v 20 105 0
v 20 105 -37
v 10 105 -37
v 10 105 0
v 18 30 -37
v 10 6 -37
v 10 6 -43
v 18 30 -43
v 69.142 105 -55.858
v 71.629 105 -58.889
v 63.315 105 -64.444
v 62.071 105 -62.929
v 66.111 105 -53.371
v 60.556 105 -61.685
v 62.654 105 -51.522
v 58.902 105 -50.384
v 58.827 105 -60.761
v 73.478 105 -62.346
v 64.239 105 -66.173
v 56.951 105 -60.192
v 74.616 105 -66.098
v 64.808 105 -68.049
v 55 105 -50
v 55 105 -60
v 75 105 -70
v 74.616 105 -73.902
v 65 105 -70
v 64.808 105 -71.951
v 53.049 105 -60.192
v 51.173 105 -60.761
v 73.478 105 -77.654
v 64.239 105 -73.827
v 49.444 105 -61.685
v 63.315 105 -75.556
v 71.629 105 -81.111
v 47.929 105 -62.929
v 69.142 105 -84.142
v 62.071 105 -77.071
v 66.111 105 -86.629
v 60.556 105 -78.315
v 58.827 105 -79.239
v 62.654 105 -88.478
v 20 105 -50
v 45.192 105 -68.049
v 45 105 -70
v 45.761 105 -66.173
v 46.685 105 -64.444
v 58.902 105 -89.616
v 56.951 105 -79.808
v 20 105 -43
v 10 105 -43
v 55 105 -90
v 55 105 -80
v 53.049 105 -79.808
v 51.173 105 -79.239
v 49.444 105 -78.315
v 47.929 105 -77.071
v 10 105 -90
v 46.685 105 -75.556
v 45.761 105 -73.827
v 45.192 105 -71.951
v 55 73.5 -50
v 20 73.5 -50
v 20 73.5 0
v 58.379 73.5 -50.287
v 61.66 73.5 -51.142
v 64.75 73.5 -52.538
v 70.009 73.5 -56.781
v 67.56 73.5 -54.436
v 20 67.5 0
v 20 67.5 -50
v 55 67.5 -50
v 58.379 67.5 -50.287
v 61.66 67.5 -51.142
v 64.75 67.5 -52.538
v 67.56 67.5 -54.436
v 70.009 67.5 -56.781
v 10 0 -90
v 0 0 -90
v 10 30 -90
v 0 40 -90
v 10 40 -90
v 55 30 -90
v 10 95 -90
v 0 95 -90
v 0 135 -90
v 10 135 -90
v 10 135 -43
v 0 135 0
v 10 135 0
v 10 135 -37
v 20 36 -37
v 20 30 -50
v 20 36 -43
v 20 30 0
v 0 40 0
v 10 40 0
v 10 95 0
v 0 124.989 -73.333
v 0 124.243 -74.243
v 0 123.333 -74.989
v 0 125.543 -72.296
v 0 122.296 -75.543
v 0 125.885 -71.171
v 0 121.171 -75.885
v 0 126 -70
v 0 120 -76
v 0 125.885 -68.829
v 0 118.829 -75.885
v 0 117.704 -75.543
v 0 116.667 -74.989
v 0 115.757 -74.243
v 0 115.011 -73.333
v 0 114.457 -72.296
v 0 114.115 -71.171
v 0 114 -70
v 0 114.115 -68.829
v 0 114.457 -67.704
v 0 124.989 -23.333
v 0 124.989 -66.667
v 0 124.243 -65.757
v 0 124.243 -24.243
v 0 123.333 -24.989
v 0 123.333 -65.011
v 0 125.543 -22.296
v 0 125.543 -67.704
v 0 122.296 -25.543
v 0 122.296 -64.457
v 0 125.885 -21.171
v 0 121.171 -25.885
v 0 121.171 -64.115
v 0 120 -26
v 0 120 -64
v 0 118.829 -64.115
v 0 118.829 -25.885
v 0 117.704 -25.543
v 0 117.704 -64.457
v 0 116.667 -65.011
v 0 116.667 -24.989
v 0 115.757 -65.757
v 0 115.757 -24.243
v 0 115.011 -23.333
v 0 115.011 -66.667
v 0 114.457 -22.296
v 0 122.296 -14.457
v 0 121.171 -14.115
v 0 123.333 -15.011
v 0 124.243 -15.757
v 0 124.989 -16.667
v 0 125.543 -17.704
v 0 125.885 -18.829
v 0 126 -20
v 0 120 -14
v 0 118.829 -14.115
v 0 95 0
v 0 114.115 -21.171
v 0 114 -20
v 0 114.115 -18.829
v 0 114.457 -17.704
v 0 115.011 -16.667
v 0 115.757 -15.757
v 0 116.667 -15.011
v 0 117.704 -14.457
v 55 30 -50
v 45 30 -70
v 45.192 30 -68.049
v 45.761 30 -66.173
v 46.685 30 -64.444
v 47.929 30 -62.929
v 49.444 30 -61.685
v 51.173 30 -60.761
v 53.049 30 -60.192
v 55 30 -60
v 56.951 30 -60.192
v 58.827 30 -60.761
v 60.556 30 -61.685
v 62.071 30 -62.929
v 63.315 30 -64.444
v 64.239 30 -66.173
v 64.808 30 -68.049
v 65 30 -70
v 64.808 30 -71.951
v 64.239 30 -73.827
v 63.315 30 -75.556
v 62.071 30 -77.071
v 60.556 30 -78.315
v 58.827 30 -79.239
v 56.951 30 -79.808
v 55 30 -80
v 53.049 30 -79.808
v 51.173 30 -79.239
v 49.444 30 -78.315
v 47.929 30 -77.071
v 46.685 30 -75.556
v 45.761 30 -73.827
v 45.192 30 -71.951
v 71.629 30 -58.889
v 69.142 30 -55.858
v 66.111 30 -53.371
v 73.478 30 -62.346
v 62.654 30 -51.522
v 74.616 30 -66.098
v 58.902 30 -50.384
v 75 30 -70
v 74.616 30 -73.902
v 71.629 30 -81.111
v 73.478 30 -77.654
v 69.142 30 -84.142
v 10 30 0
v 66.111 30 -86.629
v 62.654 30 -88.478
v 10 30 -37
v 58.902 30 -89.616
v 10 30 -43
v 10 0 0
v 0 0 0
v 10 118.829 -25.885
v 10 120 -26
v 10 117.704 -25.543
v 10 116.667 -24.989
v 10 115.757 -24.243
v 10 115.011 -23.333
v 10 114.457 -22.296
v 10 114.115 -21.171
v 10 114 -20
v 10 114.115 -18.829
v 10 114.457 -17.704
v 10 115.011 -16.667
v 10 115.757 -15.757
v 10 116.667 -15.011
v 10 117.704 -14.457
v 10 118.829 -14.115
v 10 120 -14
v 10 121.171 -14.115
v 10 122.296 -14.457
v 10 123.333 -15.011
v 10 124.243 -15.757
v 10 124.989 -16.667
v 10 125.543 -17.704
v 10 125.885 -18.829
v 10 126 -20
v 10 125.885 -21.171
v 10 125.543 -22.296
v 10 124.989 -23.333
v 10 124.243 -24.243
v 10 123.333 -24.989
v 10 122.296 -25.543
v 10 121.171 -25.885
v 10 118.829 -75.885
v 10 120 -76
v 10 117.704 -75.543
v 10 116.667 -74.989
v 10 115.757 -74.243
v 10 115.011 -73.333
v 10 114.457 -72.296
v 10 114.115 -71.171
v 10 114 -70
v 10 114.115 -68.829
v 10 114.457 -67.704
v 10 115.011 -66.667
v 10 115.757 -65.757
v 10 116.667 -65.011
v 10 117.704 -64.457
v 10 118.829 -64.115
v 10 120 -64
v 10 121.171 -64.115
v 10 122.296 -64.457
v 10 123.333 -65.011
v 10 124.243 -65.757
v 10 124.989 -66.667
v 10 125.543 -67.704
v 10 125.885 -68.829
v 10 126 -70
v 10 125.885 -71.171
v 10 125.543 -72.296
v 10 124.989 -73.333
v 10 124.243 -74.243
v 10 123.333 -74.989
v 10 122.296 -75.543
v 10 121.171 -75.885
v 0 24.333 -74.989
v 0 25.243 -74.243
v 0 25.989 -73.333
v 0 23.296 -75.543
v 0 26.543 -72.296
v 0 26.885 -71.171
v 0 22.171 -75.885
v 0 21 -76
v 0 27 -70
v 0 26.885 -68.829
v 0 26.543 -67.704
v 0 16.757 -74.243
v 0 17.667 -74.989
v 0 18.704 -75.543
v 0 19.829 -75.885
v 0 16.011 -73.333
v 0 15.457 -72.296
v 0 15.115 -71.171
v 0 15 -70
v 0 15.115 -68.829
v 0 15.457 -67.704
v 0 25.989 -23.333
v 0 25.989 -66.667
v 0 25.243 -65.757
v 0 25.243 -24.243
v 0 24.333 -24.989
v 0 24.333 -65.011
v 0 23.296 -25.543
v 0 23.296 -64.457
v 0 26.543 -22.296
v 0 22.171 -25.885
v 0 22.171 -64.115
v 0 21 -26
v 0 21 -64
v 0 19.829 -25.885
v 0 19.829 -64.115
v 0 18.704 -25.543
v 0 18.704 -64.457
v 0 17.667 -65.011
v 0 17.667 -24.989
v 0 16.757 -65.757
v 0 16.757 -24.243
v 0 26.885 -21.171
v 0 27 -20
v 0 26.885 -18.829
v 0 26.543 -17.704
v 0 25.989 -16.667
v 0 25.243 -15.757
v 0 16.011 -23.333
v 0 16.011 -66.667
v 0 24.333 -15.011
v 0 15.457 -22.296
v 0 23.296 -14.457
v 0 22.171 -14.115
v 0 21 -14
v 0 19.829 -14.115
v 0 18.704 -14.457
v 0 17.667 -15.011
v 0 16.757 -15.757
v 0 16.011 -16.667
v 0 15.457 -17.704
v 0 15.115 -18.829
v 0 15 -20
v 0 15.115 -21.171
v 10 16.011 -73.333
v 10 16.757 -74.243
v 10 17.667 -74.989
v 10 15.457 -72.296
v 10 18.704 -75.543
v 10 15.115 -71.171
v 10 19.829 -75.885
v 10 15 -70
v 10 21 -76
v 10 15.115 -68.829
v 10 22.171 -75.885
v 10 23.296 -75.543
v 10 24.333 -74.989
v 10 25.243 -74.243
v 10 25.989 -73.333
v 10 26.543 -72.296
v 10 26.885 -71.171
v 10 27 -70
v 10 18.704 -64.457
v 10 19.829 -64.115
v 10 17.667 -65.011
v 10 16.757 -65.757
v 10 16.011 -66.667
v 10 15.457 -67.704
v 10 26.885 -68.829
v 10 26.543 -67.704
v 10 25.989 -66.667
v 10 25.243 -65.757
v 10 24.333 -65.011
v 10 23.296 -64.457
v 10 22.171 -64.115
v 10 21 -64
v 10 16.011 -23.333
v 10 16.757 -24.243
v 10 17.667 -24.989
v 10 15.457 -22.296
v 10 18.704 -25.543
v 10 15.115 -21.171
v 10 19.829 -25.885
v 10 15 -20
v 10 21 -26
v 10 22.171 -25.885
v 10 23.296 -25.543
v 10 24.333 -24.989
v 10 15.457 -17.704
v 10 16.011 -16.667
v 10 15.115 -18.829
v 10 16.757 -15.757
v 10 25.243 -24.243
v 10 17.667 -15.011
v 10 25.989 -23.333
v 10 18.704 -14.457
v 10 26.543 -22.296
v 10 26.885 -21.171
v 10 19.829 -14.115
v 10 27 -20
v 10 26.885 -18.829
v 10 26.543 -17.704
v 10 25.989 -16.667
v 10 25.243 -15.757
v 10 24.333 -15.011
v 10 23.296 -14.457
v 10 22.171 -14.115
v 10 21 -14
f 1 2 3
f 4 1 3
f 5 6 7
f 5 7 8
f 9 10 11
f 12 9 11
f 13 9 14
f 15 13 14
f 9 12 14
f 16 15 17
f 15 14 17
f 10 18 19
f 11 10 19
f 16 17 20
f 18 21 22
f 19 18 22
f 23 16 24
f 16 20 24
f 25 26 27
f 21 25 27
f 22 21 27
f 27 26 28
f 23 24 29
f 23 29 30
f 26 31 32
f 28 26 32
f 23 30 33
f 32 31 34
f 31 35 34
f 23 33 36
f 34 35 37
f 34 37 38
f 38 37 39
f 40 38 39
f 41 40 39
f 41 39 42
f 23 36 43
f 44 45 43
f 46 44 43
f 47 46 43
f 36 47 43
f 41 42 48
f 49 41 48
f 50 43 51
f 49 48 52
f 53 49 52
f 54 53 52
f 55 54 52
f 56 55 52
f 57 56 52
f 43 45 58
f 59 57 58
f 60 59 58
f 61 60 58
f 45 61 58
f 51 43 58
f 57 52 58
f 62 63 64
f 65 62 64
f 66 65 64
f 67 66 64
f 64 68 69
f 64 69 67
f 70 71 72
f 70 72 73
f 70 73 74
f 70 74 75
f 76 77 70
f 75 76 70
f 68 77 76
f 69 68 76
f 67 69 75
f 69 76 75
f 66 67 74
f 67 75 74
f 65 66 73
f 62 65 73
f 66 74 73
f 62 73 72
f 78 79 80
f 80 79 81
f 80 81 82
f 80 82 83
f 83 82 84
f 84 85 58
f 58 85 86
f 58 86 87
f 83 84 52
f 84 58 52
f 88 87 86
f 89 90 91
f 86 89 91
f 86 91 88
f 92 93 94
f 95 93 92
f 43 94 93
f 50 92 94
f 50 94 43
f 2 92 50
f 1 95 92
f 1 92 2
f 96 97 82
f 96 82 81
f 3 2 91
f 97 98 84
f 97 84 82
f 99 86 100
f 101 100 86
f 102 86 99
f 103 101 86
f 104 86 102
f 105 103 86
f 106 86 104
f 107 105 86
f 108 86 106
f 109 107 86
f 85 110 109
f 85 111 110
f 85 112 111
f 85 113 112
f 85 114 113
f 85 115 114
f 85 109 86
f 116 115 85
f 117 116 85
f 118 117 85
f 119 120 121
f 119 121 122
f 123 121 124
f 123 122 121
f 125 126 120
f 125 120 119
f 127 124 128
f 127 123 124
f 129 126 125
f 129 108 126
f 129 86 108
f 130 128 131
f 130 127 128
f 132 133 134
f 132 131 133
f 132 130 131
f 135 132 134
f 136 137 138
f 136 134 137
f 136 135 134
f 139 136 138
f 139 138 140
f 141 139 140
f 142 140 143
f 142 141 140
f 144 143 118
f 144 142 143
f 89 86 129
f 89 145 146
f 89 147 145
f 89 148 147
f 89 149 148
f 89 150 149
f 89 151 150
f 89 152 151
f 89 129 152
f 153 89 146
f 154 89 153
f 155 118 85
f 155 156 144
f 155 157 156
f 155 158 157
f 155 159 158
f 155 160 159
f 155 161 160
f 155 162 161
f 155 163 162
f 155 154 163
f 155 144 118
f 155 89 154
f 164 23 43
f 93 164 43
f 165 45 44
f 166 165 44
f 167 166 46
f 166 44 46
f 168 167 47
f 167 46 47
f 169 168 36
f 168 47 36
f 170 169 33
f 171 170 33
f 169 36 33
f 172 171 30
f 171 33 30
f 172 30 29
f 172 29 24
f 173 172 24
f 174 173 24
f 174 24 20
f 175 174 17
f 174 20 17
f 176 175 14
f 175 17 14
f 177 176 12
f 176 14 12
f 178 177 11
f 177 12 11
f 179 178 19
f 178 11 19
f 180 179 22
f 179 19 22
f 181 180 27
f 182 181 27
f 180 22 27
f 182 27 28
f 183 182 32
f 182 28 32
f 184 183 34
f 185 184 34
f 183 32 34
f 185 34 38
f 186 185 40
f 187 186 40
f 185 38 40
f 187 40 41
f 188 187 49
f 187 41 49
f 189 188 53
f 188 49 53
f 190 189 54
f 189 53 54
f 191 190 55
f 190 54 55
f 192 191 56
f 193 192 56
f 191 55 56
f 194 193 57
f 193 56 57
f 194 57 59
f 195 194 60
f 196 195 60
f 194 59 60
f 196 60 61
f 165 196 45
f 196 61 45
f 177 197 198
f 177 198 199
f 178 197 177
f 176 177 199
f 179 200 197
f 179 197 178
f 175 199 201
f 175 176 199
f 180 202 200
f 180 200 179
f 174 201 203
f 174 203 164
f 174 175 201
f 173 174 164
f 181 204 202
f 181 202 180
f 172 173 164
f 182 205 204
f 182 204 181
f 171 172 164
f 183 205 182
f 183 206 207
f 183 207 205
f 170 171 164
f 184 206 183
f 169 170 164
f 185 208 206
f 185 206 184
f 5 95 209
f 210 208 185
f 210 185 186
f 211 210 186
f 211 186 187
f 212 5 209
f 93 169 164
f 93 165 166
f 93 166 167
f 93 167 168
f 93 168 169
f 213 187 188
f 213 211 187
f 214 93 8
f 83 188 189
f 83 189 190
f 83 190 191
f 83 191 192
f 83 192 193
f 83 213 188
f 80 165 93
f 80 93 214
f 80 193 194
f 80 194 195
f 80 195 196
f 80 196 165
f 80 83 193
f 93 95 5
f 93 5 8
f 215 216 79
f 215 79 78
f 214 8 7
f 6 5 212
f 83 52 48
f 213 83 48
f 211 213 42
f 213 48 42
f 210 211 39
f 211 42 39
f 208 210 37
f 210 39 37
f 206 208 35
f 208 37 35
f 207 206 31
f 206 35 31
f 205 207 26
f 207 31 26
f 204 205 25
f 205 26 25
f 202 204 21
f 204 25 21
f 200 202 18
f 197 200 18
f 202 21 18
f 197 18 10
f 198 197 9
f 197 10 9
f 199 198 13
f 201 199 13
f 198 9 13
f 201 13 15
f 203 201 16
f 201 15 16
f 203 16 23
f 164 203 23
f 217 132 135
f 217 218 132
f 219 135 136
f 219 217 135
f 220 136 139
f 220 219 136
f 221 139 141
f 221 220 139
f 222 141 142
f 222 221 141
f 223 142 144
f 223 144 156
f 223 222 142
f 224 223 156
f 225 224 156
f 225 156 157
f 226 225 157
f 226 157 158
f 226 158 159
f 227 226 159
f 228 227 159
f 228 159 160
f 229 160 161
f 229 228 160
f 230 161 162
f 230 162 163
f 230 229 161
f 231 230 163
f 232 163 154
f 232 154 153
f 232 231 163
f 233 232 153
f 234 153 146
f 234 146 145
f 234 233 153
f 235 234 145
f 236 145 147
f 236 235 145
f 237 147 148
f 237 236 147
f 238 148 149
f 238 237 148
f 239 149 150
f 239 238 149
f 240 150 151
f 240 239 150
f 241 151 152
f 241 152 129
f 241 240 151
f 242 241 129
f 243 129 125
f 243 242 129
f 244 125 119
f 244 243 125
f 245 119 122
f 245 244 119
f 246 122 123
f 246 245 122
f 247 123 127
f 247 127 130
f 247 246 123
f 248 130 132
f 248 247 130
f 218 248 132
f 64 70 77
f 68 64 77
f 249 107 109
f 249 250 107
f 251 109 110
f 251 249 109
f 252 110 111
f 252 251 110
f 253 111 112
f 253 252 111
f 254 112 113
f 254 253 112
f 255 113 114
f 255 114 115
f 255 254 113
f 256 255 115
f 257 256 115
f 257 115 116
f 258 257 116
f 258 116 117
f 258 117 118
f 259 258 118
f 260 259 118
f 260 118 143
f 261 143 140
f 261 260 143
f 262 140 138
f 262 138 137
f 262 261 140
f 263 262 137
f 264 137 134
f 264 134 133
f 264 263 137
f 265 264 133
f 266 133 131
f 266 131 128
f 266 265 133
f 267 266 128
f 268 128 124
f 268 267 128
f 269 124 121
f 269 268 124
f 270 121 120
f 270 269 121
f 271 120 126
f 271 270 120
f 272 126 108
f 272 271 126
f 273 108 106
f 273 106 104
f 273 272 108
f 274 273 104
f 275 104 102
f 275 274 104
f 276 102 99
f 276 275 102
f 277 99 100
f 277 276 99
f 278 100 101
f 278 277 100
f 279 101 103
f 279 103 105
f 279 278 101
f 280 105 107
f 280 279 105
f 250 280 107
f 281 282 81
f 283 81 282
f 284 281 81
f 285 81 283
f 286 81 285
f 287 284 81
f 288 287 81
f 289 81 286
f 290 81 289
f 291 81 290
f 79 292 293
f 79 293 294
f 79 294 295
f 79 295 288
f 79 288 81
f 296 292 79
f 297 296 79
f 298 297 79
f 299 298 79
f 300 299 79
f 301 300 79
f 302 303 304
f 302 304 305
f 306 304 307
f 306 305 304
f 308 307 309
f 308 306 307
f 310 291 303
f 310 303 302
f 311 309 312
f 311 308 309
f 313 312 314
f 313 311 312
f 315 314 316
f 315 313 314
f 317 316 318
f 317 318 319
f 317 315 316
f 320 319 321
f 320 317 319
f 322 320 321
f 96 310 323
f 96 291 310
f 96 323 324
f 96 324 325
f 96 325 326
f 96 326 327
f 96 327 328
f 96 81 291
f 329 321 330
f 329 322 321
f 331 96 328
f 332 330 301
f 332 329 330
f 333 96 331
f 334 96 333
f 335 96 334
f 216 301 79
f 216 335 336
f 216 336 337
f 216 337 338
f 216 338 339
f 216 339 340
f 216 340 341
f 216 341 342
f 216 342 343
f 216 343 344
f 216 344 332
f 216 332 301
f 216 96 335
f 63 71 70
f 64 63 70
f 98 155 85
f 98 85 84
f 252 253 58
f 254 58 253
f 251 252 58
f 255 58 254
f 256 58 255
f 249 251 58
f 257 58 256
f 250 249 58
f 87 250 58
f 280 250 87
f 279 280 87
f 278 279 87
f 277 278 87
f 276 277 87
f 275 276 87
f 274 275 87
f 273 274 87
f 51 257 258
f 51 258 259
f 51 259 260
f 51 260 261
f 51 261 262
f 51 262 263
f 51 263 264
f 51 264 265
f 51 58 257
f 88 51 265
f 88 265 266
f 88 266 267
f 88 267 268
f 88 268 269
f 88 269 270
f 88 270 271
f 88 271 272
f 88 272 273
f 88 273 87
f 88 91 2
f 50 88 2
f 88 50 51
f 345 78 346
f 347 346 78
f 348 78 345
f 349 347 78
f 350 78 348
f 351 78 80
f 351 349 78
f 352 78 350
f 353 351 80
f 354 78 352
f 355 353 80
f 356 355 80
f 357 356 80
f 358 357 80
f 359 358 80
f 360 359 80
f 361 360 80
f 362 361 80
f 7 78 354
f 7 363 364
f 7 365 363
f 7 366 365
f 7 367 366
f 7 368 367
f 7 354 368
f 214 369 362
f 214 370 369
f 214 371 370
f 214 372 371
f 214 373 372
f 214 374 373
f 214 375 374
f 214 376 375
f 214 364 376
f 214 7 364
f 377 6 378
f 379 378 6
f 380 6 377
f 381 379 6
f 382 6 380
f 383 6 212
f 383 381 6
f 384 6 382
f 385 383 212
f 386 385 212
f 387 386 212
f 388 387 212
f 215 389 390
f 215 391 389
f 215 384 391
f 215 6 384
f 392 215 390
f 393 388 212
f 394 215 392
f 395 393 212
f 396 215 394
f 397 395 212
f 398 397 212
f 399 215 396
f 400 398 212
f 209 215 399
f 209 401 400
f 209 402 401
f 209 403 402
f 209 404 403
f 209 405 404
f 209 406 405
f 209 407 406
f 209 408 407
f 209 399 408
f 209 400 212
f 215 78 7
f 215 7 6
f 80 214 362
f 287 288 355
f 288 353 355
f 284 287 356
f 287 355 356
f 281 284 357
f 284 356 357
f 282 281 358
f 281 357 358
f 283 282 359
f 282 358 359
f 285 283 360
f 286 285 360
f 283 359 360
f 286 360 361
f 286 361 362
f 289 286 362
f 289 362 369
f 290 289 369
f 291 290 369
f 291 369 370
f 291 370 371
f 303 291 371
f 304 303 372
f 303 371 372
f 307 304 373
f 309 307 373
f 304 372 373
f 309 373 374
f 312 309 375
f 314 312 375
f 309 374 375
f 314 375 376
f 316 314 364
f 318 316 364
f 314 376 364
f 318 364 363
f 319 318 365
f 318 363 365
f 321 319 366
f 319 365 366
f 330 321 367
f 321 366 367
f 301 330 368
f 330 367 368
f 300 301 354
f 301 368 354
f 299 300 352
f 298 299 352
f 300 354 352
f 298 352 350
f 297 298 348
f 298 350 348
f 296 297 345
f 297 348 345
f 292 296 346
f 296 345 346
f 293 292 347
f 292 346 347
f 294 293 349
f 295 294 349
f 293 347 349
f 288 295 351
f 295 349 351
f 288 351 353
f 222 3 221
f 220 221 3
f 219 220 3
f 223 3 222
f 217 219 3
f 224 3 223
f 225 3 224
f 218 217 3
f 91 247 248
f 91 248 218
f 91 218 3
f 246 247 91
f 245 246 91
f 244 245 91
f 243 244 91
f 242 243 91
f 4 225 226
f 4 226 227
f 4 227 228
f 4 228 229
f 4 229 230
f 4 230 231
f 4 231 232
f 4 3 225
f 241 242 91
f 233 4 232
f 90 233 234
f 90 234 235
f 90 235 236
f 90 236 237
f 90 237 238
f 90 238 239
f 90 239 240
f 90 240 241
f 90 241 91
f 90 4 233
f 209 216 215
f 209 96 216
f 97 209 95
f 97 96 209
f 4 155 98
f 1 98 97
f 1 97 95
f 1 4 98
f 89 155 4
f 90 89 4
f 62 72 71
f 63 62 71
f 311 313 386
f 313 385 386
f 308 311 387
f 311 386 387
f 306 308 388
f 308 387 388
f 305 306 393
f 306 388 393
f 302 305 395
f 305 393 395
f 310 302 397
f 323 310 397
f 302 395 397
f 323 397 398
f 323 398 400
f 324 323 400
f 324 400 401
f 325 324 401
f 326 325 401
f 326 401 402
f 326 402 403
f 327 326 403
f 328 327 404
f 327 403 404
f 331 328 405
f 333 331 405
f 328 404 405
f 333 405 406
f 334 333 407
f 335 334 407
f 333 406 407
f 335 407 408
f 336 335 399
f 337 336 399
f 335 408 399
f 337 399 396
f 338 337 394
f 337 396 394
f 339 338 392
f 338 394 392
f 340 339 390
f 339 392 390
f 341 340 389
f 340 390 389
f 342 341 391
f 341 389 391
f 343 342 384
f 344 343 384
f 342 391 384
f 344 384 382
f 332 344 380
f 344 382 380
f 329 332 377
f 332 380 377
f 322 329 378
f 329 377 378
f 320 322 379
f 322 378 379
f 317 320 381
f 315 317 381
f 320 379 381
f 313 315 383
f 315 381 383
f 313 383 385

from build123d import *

# Parameters (mm, degrees)
Y_KSEKLIK_EKSTR_ZYON1_DEPTH    = 90
IZIM3_R                        = 10
Y_KSEKLIK_EKSTR_ZYON2_DEPTH    = 75
Y_KSEKLIK_EKSTR_ZYON3_START    = -37.5
Y_KSEKLIK_EKSTR_ZYON3_DEPTH    = 6
Y_KSEKLIK_EKSTR_ZYON4_START    = -37
Y_KSEKLIK_EKSTR_ZYON4_DEPTH    = 6
F_12_0_12_AP_DELIK1_AT_2_COUNT = 2
F_12_0_12_AP_DELIK1_AT_2_PITCH = 50


with BuildPart() as part:
    # Çizim2 → Yükseklik-Ekstrüzyon1 (new body)
    with BuildSketch(Plane.XY):
        Polygon((0, 0), (10, 0), (10, 30), (20, 30), (20, 105), (10, 105), (10, 135), (0, 135), (0, 95), (10, 95), (10, 40), (0, 40), align=None)
    extrude(amount=-Y_KSEKLIK_EKSTR_ZYON1_DEPTH)

    # Çizim3 → Yükseklik-Ekstrüzyon2 (add)
    with BuildSketch(Plane(origin=(0, 105, 0), x_dir=(1, 0, 0), z_dir=(0, 1, 0))):
        with BuildLine():
            Line((20, 90), (55, 90))
            ThreePointArc((55, 90), (75, 70), (55, 50))
            Line((55, 50), (20, 50))
            Line((20, 50), (20, 90))
        make_face()
        with Locations(Location((55, 70, 0), (0, 0, 180))):
            Circle(IZIM3_R, mode=Mode.SUBTRACT)
    extrude(amount=-Y_KSEKLIK_EKSTR_ZYON2_DEPTH)

    # Çizim7 → Yükseklik-Ekstrüzyon4 (add)
    with BuildSketch(Plane.XY.offset(Y_KSEKLIK_EKSTR_ZYON4_START)):
        Polygon((10, 135), (20, 105), (10, 105), align=None)
    y_kseklik_ekstr_zyon4 = extrude(amount=-Y_KSEKLIK_EKSTR_ZYON4_DEPTH)

    # Aynalama5: Yükseklik-Ekstrüzyon4 across plane
    add(y_kseklik_ekstr_zyon4.mirror(Plane.ZX.offset(70.5)))

    # Çizim10 → Ø12.0 (12) Çap Delik1 (revolve, cut)
    with BuildSketch(Plane(origin=(10, 120, -20), x_dir=(0, 0, -1), z_dir=(0, 1, 0))):
        Polygon((0, 0), (0, 13.605163714), (6, 10), (6, 0), align=None)
    f_12_0_12_ap_delik1 = revolve(axis=Axis((16.35, 120, -20), (-1, 0, 0)), mode=Mode.SUBTRACT)

    # Ø12.0 (12) Çap Delik1 at 2: Ø12.0 (12) Çap Delik1 ×2
    with Locations(*[(0, 0, -i * F_12_0_12_AP_DELIK1_AT_2_PITCH) for i in range(1, F_12_0_12_AP_DELIK1_AT_2_COUNT)]):
        add(f_12_0_12_ap_delik1, mode=Mode.SUBTRACT)

    # Aynalama6: Ø12.0 (12) Çap Delik1 across plane
    add(f_12_0_12_ap_delik1.mirror(Plane.ZX.offset(70.5)), mode=Mode.SUBTRACT)

    # Aynalama6 copy 1 sketch → Aynalama6 copy 1 (revolve, cut)
    with BuildSketch(Plane(origin=(10, 21, -70), x_dir=(0, 0, -1), z_dir=(0, -1, 0))):
        Polygon((0, 0), (0, -13.605163714), (6, -10), (6, 0), align=None)
    revolve(axis=Axis((16.35, 21, -70), (1, 0, 0)), mode=Mode.SUBTRACT)


with BuildPart() as body_2:
    # Çizim5 → Yükseklik-Ekstrüzyon3 (new body)
    with BuildSketch(Plane(origin=(0, 105, 0), x_dir=(1, 0, 0), z_dir=(0, 1, 0)).offset(Y_KSEKLIK_EKSTR_ZYON3_START)):
        with BuildLine():
            Line((20, 0), (70.008852515, 56.781288028))
            ThreePointArc((70.008852515, 56.781288028), (63.234857636, 51.773998801), (55, 50))
            Line((55, 50), (20, 50))
            Line((20, 50), (20, 0))
        make_face()
    extrude(amount=Y_KSEKLIK_EKSTR_ZYON3_DEPTH)


solid = Compound([part.part, body_2.part])
